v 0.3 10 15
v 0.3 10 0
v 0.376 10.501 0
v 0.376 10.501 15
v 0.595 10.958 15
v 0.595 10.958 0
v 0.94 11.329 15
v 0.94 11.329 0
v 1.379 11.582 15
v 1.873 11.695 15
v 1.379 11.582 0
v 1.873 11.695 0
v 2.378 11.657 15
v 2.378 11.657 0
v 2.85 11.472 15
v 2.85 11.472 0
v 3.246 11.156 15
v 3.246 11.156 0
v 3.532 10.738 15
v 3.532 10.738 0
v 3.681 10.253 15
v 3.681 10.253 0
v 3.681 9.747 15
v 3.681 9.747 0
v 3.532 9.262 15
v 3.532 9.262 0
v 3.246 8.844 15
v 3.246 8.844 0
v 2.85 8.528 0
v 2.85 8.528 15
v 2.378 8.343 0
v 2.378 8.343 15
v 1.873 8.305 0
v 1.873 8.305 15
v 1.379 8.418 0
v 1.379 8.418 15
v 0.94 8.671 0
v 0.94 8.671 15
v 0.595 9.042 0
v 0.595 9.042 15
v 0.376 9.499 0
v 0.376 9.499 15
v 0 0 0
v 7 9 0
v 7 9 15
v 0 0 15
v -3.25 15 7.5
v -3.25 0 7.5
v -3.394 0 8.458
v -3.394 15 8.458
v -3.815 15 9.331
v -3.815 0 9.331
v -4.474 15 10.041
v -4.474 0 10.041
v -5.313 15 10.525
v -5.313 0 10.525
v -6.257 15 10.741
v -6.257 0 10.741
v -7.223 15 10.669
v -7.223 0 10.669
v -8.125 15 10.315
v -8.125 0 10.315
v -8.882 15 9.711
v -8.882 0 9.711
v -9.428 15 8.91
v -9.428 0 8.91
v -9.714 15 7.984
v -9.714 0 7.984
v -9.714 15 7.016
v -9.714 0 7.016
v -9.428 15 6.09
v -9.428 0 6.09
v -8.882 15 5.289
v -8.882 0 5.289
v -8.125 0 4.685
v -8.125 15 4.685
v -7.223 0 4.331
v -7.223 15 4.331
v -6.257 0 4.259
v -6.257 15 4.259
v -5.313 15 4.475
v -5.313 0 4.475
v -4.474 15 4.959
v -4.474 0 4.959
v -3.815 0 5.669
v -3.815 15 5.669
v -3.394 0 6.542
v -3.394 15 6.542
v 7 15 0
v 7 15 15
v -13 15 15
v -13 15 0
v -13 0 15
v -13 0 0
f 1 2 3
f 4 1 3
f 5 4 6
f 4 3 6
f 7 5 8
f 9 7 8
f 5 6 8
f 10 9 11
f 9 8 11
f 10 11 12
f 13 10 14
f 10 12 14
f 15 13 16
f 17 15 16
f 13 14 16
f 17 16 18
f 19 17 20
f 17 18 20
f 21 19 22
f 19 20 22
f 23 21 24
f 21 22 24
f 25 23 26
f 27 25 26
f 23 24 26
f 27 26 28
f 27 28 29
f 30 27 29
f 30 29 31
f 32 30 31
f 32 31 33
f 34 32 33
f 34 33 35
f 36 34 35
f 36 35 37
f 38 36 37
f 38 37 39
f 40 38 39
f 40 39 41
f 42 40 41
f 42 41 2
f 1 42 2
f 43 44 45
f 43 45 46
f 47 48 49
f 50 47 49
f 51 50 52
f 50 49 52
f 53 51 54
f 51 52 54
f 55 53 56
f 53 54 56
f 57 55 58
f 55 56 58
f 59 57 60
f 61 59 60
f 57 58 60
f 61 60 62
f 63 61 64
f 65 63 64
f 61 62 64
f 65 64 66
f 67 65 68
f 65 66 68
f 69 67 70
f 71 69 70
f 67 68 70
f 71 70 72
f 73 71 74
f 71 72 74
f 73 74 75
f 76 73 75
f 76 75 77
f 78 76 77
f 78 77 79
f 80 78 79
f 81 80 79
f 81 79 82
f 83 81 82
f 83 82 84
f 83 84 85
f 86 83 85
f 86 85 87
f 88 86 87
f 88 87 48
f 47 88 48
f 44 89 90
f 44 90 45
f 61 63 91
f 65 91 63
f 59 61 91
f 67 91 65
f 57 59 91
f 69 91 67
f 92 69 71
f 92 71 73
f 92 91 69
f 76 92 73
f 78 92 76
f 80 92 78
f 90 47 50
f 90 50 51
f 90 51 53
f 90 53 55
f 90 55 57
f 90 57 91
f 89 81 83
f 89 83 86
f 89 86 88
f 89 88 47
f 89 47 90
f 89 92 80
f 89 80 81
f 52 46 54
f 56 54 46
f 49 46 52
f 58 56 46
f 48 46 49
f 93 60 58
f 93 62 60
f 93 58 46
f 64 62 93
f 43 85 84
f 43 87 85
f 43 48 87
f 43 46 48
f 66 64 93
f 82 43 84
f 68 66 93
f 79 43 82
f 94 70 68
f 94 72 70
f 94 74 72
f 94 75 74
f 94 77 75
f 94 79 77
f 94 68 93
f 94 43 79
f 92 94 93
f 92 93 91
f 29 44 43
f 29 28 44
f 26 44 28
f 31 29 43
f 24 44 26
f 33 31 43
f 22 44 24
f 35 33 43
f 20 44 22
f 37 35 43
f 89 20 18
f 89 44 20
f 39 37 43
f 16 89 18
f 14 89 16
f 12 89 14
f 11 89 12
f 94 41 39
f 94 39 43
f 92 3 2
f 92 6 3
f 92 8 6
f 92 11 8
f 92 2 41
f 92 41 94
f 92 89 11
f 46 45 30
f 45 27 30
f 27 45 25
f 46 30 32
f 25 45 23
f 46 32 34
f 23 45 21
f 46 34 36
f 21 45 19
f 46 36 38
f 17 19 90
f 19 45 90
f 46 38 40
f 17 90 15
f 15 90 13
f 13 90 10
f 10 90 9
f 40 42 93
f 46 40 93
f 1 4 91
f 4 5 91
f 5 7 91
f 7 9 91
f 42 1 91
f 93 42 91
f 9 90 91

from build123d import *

# Parameters (mm, degrees)
ESTRUSIONE_ESTRUSIONE1_DEPTH = 15
FORO_PER_VITE_M3_1_D         = 3.4
SCHIZZO5_R                   = 3.25
TAGLIO_ESTRUSIONE1_DEPTH     = 25.879710609


with BuildPart() as part:
    # Schizzo1 → Estrusione-Estrusione1 (new body)
    with BuildSketch(Plane.XY):
        Polygon((0, 0), (-13, 0), (-13, 15), (7, 15), (7, 9), align=None)
    extrude(amount=ESTRUSIONE_ESTRUSIONE1_DEPTH)

    # Foro per Vite M3-1 (through all)
    with Locations(Plane.XY.offset(15)):
        with Locations((2, 10)):
            Hole(FORO_PER_VITE_M3_1_D / 2)

    # Schizzo5 → Taglio-Estrusione1 (cut, through all)
    with BuildSketch(Plane(origin=(0, 0, 0), x_dir=(-1, 0, 0), z_dir=(0, -1, 0))):
        with Locations(Location((6.5, -7.5, 0), (0, 0, 180))):
            Circle(SCHIZZO5_R)
    extrude(amount=-TAGLIO_ESTRUSIONE1_DEPTH, mode=Mode.SUBTRACT)


solid = part.part
